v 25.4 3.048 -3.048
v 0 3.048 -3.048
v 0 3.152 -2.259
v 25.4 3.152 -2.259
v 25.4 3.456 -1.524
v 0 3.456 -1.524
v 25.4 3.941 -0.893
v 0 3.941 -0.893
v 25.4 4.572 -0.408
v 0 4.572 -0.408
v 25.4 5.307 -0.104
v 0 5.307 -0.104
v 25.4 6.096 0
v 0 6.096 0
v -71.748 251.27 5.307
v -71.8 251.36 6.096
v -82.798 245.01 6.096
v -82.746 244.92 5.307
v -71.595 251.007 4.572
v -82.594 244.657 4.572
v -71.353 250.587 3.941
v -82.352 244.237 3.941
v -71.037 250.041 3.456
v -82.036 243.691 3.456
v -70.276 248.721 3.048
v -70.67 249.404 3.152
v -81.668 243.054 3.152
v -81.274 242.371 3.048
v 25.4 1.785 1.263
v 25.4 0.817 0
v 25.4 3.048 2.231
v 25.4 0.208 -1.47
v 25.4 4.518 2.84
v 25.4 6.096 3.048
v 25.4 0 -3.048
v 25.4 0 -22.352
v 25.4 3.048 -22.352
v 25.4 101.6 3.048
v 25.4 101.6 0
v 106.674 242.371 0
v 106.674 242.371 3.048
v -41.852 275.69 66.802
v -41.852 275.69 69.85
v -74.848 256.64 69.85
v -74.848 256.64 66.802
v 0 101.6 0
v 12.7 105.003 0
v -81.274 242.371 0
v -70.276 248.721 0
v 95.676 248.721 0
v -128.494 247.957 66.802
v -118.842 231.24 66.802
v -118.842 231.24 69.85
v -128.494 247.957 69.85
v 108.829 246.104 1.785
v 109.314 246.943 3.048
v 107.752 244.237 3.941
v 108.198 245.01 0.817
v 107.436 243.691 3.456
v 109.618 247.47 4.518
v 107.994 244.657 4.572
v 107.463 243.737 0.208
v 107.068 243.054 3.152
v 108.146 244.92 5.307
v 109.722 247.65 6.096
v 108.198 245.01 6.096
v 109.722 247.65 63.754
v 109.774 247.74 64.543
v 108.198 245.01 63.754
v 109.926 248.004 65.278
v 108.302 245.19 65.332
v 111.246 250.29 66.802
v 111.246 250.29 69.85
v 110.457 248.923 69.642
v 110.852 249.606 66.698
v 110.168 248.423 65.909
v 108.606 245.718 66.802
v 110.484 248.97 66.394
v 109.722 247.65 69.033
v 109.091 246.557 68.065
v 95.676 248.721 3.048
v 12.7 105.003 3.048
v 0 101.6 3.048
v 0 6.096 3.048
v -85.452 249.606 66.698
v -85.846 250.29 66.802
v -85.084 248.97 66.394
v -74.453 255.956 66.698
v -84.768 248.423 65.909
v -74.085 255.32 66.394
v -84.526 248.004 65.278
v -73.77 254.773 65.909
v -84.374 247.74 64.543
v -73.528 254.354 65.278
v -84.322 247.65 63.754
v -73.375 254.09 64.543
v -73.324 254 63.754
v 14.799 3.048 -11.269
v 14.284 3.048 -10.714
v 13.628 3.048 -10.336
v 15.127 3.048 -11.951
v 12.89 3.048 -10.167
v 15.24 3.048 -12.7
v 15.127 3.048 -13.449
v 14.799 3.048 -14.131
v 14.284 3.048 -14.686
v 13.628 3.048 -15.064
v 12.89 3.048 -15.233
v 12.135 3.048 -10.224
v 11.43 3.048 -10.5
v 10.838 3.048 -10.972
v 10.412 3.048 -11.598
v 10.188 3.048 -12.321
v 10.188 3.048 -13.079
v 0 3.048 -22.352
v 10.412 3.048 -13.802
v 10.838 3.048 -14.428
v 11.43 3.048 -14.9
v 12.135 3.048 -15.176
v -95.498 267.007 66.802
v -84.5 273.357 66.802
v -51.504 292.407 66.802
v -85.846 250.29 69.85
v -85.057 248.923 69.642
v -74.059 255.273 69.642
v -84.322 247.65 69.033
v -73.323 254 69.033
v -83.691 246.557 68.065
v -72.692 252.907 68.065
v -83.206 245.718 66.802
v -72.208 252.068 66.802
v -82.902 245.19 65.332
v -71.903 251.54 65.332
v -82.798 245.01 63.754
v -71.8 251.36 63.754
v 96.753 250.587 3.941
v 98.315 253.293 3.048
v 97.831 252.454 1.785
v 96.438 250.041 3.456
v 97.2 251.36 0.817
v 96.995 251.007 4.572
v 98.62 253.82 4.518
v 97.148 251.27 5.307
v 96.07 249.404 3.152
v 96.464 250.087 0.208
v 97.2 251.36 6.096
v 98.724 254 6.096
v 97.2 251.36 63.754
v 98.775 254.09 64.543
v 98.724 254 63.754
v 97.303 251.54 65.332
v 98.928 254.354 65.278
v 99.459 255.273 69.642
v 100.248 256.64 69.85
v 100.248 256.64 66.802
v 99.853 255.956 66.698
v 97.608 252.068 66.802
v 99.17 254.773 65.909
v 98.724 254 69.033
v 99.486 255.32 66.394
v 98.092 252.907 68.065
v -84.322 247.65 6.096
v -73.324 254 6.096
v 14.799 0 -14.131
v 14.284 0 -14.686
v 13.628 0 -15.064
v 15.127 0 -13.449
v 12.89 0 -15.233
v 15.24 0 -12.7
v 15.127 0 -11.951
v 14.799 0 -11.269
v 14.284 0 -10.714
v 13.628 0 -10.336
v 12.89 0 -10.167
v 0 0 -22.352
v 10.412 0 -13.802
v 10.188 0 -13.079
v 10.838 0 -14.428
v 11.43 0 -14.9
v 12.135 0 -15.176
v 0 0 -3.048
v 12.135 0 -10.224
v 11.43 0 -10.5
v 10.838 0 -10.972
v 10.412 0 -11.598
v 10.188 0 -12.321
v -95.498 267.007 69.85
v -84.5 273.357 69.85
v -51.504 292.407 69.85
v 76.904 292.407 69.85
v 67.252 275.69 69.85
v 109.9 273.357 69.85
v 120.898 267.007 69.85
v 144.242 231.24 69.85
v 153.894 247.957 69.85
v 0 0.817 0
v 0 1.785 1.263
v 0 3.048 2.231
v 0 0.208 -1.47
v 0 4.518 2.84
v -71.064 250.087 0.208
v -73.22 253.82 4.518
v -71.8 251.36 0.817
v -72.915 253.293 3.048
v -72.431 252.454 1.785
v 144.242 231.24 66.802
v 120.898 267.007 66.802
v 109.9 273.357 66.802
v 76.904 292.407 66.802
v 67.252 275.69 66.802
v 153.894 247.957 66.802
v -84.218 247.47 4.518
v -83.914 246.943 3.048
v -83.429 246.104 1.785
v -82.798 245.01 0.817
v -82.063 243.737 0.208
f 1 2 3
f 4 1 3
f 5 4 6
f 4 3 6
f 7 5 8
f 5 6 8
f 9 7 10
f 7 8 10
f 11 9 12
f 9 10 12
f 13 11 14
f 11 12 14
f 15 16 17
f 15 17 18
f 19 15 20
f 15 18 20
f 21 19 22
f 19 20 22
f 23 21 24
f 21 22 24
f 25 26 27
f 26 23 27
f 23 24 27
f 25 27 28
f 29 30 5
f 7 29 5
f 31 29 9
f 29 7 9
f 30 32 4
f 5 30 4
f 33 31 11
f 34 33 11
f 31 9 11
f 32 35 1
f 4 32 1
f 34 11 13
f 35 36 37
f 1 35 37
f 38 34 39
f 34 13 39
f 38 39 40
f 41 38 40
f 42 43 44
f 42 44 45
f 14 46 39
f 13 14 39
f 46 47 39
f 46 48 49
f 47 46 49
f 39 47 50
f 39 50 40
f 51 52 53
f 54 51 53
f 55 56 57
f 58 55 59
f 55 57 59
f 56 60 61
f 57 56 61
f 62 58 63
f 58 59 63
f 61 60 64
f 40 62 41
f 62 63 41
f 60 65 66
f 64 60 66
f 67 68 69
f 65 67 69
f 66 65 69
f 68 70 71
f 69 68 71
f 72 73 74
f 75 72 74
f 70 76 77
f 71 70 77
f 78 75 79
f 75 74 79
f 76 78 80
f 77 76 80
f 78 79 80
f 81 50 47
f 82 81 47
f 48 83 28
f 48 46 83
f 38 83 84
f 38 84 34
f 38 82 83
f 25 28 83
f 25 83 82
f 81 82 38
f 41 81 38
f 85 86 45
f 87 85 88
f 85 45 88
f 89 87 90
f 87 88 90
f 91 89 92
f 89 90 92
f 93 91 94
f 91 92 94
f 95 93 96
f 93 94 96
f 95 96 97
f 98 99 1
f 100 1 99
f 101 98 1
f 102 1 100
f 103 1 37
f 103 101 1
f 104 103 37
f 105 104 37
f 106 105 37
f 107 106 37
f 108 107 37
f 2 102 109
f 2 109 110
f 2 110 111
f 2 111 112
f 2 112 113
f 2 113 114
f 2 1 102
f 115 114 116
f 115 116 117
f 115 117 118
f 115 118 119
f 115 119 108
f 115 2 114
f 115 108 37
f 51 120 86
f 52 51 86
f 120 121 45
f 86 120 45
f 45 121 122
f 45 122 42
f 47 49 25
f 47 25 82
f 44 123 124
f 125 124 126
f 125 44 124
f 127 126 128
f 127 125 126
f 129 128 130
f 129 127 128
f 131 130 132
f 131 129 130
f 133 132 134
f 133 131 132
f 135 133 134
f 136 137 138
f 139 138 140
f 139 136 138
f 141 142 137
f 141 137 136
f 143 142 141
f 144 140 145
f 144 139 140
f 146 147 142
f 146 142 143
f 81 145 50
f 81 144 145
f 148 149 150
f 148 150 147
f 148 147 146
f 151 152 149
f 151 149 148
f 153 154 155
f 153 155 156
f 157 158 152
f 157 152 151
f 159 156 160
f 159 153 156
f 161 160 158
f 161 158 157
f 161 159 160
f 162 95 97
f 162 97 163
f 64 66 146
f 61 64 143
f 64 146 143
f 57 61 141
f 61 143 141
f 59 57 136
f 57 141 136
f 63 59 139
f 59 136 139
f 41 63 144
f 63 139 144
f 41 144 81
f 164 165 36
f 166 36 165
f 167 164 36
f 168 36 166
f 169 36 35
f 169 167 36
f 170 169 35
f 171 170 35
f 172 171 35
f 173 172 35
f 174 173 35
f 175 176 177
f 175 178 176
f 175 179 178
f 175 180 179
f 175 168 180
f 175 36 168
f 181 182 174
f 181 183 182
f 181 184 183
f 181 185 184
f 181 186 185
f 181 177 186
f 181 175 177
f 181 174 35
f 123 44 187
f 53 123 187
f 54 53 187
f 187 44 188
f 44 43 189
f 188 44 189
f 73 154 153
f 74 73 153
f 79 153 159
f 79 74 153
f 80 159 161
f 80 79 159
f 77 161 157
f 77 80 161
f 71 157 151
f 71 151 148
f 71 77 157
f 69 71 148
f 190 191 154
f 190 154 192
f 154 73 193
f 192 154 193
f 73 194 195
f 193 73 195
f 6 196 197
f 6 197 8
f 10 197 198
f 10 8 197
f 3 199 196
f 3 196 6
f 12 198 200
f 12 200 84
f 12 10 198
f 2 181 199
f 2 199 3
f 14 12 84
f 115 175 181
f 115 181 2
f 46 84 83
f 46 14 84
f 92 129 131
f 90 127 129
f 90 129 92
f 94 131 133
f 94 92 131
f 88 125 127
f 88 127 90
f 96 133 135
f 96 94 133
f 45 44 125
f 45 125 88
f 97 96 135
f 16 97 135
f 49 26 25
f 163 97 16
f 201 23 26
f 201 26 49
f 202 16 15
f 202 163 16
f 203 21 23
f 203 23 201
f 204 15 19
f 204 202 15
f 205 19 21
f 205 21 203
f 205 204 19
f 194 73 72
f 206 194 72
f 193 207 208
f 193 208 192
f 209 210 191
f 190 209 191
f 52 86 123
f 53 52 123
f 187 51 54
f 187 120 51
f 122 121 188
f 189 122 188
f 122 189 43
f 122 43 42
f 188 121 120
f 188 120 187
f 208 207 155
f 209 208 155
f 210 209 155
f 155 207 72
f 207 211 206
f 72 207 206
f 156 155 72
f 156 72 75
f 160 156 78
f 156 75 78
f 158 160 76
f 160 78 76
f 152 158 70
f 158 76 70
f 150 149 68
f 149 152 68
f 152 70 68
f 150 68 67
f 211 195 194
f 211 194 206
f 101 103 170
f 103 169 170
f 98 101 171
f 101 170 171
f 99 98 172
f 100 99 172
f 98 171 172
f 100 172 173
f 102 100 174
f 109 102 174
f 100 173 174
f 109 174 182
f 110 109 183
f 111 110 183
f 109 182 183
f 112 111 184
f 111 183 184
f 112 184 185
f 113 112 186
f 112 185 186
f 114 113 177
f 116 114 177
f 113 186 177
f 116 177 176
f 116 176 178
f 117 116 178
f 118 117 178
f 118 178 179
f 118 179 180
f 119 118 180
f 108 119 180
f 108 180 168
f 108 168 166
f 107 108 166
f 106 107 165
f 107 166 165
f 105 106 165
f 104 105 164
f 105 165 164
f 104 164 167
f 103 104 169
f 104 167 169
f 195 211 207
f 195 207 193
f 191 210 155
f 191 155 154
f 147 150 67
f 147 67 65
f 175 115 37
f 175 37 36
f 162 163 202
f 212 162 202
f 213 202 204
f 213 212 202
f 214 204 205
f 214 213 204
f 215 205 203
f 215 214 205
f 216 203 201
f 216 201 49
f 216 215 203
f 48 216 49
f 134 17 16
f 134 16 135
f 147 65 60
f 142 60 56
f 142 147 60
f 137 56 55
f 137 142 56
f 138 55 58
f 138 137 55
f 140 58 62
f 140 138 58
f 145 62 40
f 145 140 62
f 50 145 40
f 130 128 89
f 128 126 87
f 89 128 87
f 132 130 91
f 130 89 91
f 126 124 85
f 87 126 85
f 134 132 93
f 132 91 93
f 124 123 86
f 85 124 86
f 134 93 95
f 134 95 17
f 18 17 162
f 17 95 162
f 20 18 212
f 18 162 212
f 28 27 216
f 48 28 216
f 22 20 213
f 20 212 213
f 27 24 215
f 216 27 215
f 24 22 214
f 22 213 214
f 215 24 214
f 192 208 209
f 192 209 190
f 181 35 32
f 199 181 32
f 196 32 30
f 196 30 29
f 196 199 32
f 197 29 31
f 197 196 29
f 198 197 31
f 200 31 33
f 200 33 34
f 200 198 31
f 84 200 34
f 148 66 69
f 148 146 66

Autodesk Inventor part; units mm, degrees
ref_plane "YZ Plane" through (0, 0, 0) normal (1, 0, 0) x (0, 1, 0)
ref_plane "XZ Plane" through (0, 0, 0) normal (0, 1, 0) x (-1, 0, 0)
ref_plane "XY Plane" through (0, 0, 0) normal (0, 0, 1) x (1, 0, 0)
sketch "Sketch13" plane through (0, 0, 0) normal (0, 0, 1) x (1, 0, 0)
  line L0 (0, 0) -> (25.4, 0)
  line L1 (25.4, 0) -> (25.4, 101.6)
  line L2 (0, 0) -> (0, 101.6)
  line L3 (0, 101.6) -> (-84.322, 247.65)
  line L4 (25.4, 101.6) -> (166.7245, 101.6) construction
  line L5 (25.4, 101.6) -> (109.722, 247.65)
  line L6 (25.4, 101.6) -> (194.044, 101.6) construction
  line L7 (-84.322, 247.65) -> (-73.3235, 254)
  line L8 (109.722, 247.65) -> (98.7235, 254)
  line L9 (-73.3235, 254) -> (12.7, 105.003)
  line L10 (98.7235, 254) -> (12.7, 105.003)
  dimension "d54" = 25.4
  dimension "d55" = 101.6
  dimension "d133" = 60
  dimension "d134" = 150
  dimension "d135" = 12.7
  dimension "d137" = 12.7
  dimension "d139" = 0
  dimension "d140" = 152.4
  dimension "d141" = 152.4
extrude "Plate5" add sketch "Sketch13" along normal blind 3.048
ref_plane "Work Plane1" through (0, 0, 25.4) normal (0, -1, 0) x (1, 0, 0)
sketch "Sketch20" plane through (0, 3.048, 3.048) normal (0, -1, 0) x (1, 0, 0)
  line L0 (25.4, 0) -> (0, 0)
  line L1 (0, 0) -> (0, -25.4)
  line L2 (0, -25.4) -> (25.4, -25.4)
  line L3 (25.4, -25.4) -> (25.4, 0)
edge flange "Flange7" height 25.4 angle 90 thickness 3.048 bend radius 3.048 thickness toward (0, -1, 0) relief tear relief width 3.048 relief depth 1.524 edges at (12.7, 0, 0) wall of the first edge with corners at (25.4, 3.048, 3.048) (0, 3.048, 3.048) (0, 3.048, -22.352) (25.4, 3.048, -22.352)
bend "Bend7"
corner "Corner7"
sketch "Sketch21" plane through (0, 0, -22.352) normal (0, -1, 0) x (1, 0, 0)
  line L0 (25.4, 0) -> (0, 0) projected
  line L1 (25.4, 19.304) -> (25.4, 0) projected
  circle A0 centre (12.7, 9.652) radius 2.54
  point P0 (0, 22.352)
  dimension "d123" = 5.08
  dimension "d124" = 12.7
  dimension "d125" = 9.652
extrude "Cut3" cut sketch "Sketch21" against normal blind 3.048
sketch "Sketch24" plane through (-82.798, 245.0104, 0) normal (-0.5, 0.8660254, 0) x (-0.8660254, -0.5, 0)
  line L0 (-12.7, 0) -> (0, 0)
  line L1 (0, 0) -> (0, 69.85)
  line L2 (0, 69.85) -> (-12.7, 69.85)
  line L3 (-12.7, 69.85) -> (-12.7, 0)
edge flange "Flange8" height 69.85 angle 90 thickness 3.048 bend radius 3.048 thickness toward (-0.5, 0.8660254, 0) relief tear relief width 3.048 relief depth 1.524 corner gap 3.048 corner form 0 edges at (-78.8227, 250.825, 3.048) (104.2227, 250.825, 3.048) wall of the first edge with corners at (-71.7995, 251.3604, 0) (-82.798, 245.0104, 0) (-82.798, 245.0104, 69.85) (-71.7995, 251.3604, 69.85)
bend "Bend8"
corner "Corner8"
sketch "Sketch25" plane through (-71.7995, 251.3604, 66.802) normal (0, 0, 1) x (1, 0, 0)
  line L0 (-10.9985, -6.35) -> (0, 0)
  line L1 (0, 0) -> (-12.7, 21.997)
  line L2 (-12.7, 21.997) -> (-23.6985, 15.647)
  line L3 (-23.6985, 15.647) -> (-10.9985, -6.35)
edge flange "Flange9" height 25.4 angle 90 thickness 3.048 bend radius 3.048 thickness toward (0, 0, 1) relief tear relief width 3.048 relief depth 1.524 corner gap 3.048 corner form 0 edges at (-78.8227, 250.825, 69.85) (104.2227, 250.825, 69.85) wall of the first edge with corners at (-82.798, 245.0104, 66.802) (-71.7995, 251.3604, 66.802) (-84.4995, 273.3574, 66.802) (-95.498, 267.0074, 66.802)
bend "Bend9"
corner "Corner9"
sketch "Sketch26" plane through (-84.4995, 273.3574, 69.85) normal (0.8660254, 0.5, 0) x (0, 0, -1)
  line L0 (0, -19.304) -> (3.048, -19.304) projected
  line L1 (3.048, 0) -> (3.048, -19.304) projected
  line L2 (3.048, 0) -> (0, 0) projected
  line L3 (0, 0) -> (0, -19.304) projected
  point P0 (69.85, -278.9842)
extrude "Extrusion10" add sketch "Sketch26" along normal blind 38.1
sketch "Sketch27" plane through (120.898, 267.0074, 69.85) normal (0.8660254, -0.5, 0) x (0, 0, -1)
  line L0 (0, -19.304) -> (3.048, -19.304) projected
  line L1 (3.048, 0) -> (3.048, -19.304) projected
  line L2 (3.048, 0) -> (0, 0) projected
  line L3 (0, 0) -> (0, -19.304) projected
  point P0 (69.85, -291.6842)
extrude "Extrusion11" add sketch "Sketch27" along normal blind 38.1
sketch "Sketch28" plane through (-95.498, 267.0074, 66.802) normal (-0.8660254, -0.5, 0) x (0, 0, 1)
  line L0 (0, -19.304) -> (3.048, -19.304) projected
  line L1 (3.048, -19.304) -> (3.048, 0) projected
  line L2 (0, 0) -> (3.048, 0) projected
  line L3 (0, 0) -> (0, -19.304) projected
  point P0 (-66.802, -278.9842)
extrude "Extrusion12" add sketch "Sketch28" along normal blind 38.1
sketch "Sketch29" plane through (109.8995, 273.3574, 66.802) normal (-0.8660254, 0.5, 0) x (0, 0, 1)
  line L0 (0, -19.304) -> (3.048, -19.304) projected
  line L1 (3.048, -19.304) -> (3.048, 0) projected
  line L2 (0, 0) -> (3.048, 0) projected
  line L3 (0, 0) -> (0, -19.304) projected
  point P0 (-66.802, -291.6842)
extrude "Extrusion13" add sketch "Sketch29" along normal blind 38.1
equation "\"d126\" = Thickness"
equation "\"d113\" = BendReliefWidth"
equation "\"d114\" = BendReliefDepth"
equation "\"d115\" = MinimumRemnant"
equation "\"d116\" = BendRadius"
equation "\"d119\" = BendRadius"
equation "\"d120\" = CornerReliefSize"
equation "\"d121\" = GapSize"
equation "\"d122\" = JacobiRadiusSize"
equation "\"d142\" = BendReliefWidth"
equation "\"d143\" = BendReliefDepth"
equation "\"d144\" = MinimumRemnant"
equation "\"d145\" = BendRadius"
equation "\"d148\" = BendRadius"
equation "\"d149\" = CornerReliefSize"
equation "\"d150\" = GapSize"
equation "\"d151\" = JacobiRadiusSize"
equation "\"d152\" = BendReliefWidth"
equation "\"d153\" = BendReliefDepth"
equation "\"d154\" = MinimumRemnant"
equation "\"d155\" = BendRadius"
equation "\"d158\" = BendRadius"
equation "\"d159\" = CornerReliefSize"
equation "\"d160\" = GapSize"
equation "\"d161\" = JacobiRadiusSize"
equation "\"BendRadius\" = Thickness"
equation "\"BendReliefWidth\" = Thickness"
equation "\"BendReliefDepth\" = 0.5 * Thickness"
equation "\"CornerReliefSize\" = 4 * Thickness"
equation "\"MinimumRemnant\" = 2 * Thickness"
equation "\"TransitionRadius\" = BendRadius"
equation "\"JacobiRadiusSize\" = BendRadius"
equation "\"GapSize\" = Thickness"
equation "\"d2\" = BendRadius"
equation "\"d69\" = BendRadius"
equation "\"Thickness\" = 3.048"
properties part number "Feeder-Grabber_v2" material "Aluminum 6061"
